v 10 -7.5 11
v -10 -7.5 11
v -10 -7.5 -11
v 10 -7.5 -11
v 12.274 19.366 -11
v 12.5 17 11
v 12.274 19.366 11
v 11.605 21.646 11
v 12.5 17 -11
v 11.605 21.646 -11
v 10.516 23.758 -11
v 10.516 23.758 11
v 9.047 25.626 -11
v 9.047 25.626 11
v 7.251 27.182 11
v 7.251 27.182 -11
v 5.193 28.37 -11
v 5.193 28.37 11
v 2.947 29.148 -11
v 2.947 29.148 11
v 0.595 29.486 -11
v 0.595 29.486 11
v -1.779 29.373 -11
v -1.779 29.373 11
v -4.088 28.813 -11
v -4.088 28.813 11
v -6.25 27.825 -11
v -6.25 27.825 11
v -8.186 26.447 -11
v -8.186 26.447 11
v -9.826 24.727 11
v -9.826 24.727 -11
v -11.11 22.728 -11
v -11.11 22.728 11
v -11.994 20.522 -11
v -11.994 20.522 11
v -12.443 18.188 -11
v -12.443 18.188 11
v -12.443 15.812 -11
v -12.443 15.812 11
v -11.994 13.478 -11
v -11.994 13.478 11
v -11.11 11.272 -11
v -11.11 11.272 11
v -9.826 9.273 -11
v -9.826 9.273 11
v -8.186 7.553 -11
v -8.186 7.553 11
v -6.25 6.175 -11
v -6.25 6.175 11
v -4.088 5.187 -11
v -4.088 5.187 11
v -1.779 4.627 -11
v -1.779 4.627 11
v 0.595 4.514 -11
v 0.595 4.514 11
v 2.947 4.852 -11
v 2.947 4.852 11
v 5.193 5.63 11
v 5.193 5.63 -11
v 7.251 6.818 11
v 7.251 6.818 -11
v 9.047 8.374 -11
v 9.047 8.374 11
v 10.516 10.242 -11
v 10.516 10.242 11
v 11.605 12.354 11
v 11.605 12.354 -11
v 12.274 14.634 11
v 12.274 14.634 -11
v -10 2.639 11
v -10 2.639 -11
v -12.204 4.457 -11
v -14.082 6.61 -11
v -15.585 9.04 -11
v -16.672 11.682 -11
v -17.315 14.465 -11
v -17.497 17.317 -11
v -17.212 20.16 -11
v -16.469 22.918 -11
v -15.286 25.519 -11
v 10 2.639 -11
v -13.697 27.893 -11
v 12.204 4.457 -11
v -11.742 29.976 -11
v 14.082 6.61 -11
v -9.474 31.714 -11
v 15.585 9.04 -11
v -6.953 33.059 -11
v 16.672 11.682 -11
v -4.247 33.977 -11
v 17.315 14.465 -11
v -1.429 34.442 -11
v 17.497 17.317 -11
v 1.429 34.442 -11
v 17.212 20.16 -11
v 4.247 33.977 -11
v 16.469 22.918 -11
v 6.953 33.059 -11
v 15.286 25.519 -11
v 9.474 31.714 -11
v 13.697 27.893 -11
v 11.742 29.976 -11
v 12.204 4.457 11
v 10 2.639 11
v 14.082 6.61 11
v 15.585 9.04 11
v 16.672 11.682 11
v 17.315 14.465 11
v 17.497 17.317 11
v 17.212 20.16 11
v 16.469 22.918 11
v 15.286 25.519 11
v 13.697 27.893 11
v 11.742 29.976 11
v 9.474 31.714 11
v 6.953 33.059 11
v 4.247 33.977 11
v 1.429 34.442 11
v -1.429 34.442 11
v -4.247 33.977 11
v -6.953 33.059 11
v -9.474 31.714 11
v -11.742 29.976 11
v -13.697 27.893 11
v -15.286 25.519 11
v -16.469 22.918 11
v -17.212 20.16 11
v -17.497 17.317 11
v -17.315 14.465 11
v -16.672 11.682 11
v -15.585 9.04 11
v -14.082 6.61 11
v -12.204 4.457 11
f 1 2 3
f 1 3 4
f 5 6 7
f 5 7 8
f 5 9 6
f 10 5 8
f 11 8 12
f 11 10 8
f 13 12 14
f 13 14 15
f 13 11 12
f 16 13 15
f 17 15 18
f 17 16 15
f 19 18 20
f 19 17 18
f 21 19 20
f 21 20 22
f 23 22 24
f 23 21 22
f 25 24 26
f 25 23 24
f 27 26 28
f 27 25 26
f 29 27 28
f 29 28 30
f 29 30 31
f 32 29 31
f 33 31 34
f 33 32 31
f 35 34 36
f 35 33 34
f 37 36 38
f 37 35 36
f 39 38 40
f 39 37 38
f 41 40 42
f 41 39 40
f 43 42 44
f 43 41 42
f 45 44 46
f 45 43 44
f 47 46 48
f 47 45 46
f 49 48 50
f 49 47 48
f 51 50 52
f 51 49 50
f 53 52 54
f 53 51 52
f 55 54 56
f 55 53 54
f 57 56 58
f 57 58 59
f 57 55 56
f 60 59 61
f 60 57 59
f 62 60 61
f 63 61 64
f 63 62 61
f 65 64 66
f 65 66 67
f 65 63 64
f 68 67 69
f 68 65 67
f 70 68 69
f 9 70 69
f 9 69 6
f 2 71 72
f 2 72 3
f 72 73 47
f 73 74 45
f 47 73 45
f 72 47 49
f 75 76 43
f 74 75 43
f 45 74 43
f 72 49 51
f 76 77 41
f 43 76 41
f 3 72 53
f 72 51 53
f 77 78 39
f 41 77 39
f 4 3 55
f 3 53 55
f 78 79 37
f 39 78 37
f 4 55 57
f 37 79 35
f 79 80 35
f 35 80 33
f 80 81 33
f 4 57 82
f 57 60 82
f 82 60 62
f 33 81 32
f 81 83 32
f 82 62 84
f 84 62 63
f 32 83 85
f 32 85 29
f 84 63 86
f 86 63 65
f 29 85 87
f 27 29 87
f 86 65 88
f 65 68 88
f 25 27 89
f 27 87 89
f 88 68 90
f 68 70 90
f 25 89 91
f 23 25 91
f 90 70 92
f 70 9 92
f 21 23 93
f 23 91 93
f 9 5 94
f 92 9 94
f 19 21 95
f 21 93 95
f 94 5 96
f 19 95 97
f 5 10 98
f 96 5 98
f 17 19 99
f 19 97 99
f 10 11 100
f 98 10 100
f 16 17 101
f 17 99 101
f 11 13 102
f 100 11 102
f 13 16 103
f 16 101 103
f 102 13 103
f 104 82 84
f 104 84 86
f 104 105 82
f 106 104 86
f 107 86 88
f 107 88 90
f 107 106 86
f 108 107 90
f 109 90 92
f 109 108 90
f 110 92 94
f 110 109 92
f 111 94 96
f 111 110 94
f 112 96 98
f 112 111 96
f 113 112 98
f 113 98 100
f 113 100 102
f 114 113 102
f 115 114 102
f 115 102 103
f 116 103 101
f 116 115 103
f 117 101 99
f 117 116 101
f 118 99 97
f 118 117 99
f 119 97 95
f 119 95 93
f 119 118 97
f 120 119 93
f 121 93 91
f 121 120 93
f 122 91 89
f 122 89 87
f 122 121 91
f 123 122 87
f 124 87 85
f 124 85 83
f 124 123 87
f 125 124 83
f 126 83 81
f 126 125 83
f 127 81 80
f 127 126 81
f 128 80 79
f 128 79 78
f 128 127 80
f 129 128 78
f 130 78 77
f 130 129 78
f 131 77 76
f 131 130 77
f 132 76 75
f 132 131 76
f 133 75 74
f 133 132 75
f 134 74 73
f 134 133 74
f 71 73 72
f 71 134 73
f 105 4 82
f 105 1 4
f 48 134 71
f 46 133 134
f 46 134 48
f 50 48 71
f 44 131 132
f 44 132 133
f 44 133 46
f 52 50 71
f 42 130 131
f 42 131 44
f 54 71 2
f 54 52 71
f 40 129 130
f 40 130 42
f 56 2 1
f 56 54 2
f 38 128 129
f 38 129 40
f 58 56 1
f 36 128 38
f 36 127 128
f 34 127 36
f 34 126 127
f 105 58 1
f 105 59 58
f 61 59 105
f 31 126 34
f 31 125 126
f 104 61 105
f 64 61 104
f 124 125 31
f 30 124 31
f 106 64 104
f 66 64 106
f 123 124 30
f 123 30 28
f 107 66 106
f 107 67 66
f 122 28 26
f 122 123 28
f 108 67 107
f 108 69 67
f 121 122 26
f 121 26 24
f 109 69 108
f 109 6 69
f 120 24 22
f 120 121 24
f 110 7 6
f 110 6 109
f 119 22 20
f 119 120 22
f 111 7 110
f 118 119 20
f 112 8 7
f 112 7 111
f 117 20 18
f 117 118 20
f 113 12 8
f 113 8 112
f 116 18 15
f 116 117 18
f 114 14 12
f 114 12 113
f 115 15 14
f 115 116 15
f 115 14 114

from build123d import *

# Parameters (mm, degrees)
SKETCH_1_R      = 12.5
EXTRUDE_1_DEPTH = 11


with BuildPart() as part:
    # 草图1 → 凸台-拉伸1 (new, symmetric)
    with BuildSketch(Plane.XY):
        with BuildLine():
            ThreePointArc((10, 2.638593384), (0, 34.5), (-10, 2.638593384))
            Line((-10, 2.638593384), (-10, -7.5))
            Line((-10, -7.5), (10, -7.5))
            Line((10, -7.5), (10, 2.638593384))
        make_face()
        with Locations((0, 17)):
            Circle(SKETCH_1_R, mode=Mode.SUBTRACT)
    extrude(amount=EXTRUDE_1_DEPTH, both=True)


solid = part.part
